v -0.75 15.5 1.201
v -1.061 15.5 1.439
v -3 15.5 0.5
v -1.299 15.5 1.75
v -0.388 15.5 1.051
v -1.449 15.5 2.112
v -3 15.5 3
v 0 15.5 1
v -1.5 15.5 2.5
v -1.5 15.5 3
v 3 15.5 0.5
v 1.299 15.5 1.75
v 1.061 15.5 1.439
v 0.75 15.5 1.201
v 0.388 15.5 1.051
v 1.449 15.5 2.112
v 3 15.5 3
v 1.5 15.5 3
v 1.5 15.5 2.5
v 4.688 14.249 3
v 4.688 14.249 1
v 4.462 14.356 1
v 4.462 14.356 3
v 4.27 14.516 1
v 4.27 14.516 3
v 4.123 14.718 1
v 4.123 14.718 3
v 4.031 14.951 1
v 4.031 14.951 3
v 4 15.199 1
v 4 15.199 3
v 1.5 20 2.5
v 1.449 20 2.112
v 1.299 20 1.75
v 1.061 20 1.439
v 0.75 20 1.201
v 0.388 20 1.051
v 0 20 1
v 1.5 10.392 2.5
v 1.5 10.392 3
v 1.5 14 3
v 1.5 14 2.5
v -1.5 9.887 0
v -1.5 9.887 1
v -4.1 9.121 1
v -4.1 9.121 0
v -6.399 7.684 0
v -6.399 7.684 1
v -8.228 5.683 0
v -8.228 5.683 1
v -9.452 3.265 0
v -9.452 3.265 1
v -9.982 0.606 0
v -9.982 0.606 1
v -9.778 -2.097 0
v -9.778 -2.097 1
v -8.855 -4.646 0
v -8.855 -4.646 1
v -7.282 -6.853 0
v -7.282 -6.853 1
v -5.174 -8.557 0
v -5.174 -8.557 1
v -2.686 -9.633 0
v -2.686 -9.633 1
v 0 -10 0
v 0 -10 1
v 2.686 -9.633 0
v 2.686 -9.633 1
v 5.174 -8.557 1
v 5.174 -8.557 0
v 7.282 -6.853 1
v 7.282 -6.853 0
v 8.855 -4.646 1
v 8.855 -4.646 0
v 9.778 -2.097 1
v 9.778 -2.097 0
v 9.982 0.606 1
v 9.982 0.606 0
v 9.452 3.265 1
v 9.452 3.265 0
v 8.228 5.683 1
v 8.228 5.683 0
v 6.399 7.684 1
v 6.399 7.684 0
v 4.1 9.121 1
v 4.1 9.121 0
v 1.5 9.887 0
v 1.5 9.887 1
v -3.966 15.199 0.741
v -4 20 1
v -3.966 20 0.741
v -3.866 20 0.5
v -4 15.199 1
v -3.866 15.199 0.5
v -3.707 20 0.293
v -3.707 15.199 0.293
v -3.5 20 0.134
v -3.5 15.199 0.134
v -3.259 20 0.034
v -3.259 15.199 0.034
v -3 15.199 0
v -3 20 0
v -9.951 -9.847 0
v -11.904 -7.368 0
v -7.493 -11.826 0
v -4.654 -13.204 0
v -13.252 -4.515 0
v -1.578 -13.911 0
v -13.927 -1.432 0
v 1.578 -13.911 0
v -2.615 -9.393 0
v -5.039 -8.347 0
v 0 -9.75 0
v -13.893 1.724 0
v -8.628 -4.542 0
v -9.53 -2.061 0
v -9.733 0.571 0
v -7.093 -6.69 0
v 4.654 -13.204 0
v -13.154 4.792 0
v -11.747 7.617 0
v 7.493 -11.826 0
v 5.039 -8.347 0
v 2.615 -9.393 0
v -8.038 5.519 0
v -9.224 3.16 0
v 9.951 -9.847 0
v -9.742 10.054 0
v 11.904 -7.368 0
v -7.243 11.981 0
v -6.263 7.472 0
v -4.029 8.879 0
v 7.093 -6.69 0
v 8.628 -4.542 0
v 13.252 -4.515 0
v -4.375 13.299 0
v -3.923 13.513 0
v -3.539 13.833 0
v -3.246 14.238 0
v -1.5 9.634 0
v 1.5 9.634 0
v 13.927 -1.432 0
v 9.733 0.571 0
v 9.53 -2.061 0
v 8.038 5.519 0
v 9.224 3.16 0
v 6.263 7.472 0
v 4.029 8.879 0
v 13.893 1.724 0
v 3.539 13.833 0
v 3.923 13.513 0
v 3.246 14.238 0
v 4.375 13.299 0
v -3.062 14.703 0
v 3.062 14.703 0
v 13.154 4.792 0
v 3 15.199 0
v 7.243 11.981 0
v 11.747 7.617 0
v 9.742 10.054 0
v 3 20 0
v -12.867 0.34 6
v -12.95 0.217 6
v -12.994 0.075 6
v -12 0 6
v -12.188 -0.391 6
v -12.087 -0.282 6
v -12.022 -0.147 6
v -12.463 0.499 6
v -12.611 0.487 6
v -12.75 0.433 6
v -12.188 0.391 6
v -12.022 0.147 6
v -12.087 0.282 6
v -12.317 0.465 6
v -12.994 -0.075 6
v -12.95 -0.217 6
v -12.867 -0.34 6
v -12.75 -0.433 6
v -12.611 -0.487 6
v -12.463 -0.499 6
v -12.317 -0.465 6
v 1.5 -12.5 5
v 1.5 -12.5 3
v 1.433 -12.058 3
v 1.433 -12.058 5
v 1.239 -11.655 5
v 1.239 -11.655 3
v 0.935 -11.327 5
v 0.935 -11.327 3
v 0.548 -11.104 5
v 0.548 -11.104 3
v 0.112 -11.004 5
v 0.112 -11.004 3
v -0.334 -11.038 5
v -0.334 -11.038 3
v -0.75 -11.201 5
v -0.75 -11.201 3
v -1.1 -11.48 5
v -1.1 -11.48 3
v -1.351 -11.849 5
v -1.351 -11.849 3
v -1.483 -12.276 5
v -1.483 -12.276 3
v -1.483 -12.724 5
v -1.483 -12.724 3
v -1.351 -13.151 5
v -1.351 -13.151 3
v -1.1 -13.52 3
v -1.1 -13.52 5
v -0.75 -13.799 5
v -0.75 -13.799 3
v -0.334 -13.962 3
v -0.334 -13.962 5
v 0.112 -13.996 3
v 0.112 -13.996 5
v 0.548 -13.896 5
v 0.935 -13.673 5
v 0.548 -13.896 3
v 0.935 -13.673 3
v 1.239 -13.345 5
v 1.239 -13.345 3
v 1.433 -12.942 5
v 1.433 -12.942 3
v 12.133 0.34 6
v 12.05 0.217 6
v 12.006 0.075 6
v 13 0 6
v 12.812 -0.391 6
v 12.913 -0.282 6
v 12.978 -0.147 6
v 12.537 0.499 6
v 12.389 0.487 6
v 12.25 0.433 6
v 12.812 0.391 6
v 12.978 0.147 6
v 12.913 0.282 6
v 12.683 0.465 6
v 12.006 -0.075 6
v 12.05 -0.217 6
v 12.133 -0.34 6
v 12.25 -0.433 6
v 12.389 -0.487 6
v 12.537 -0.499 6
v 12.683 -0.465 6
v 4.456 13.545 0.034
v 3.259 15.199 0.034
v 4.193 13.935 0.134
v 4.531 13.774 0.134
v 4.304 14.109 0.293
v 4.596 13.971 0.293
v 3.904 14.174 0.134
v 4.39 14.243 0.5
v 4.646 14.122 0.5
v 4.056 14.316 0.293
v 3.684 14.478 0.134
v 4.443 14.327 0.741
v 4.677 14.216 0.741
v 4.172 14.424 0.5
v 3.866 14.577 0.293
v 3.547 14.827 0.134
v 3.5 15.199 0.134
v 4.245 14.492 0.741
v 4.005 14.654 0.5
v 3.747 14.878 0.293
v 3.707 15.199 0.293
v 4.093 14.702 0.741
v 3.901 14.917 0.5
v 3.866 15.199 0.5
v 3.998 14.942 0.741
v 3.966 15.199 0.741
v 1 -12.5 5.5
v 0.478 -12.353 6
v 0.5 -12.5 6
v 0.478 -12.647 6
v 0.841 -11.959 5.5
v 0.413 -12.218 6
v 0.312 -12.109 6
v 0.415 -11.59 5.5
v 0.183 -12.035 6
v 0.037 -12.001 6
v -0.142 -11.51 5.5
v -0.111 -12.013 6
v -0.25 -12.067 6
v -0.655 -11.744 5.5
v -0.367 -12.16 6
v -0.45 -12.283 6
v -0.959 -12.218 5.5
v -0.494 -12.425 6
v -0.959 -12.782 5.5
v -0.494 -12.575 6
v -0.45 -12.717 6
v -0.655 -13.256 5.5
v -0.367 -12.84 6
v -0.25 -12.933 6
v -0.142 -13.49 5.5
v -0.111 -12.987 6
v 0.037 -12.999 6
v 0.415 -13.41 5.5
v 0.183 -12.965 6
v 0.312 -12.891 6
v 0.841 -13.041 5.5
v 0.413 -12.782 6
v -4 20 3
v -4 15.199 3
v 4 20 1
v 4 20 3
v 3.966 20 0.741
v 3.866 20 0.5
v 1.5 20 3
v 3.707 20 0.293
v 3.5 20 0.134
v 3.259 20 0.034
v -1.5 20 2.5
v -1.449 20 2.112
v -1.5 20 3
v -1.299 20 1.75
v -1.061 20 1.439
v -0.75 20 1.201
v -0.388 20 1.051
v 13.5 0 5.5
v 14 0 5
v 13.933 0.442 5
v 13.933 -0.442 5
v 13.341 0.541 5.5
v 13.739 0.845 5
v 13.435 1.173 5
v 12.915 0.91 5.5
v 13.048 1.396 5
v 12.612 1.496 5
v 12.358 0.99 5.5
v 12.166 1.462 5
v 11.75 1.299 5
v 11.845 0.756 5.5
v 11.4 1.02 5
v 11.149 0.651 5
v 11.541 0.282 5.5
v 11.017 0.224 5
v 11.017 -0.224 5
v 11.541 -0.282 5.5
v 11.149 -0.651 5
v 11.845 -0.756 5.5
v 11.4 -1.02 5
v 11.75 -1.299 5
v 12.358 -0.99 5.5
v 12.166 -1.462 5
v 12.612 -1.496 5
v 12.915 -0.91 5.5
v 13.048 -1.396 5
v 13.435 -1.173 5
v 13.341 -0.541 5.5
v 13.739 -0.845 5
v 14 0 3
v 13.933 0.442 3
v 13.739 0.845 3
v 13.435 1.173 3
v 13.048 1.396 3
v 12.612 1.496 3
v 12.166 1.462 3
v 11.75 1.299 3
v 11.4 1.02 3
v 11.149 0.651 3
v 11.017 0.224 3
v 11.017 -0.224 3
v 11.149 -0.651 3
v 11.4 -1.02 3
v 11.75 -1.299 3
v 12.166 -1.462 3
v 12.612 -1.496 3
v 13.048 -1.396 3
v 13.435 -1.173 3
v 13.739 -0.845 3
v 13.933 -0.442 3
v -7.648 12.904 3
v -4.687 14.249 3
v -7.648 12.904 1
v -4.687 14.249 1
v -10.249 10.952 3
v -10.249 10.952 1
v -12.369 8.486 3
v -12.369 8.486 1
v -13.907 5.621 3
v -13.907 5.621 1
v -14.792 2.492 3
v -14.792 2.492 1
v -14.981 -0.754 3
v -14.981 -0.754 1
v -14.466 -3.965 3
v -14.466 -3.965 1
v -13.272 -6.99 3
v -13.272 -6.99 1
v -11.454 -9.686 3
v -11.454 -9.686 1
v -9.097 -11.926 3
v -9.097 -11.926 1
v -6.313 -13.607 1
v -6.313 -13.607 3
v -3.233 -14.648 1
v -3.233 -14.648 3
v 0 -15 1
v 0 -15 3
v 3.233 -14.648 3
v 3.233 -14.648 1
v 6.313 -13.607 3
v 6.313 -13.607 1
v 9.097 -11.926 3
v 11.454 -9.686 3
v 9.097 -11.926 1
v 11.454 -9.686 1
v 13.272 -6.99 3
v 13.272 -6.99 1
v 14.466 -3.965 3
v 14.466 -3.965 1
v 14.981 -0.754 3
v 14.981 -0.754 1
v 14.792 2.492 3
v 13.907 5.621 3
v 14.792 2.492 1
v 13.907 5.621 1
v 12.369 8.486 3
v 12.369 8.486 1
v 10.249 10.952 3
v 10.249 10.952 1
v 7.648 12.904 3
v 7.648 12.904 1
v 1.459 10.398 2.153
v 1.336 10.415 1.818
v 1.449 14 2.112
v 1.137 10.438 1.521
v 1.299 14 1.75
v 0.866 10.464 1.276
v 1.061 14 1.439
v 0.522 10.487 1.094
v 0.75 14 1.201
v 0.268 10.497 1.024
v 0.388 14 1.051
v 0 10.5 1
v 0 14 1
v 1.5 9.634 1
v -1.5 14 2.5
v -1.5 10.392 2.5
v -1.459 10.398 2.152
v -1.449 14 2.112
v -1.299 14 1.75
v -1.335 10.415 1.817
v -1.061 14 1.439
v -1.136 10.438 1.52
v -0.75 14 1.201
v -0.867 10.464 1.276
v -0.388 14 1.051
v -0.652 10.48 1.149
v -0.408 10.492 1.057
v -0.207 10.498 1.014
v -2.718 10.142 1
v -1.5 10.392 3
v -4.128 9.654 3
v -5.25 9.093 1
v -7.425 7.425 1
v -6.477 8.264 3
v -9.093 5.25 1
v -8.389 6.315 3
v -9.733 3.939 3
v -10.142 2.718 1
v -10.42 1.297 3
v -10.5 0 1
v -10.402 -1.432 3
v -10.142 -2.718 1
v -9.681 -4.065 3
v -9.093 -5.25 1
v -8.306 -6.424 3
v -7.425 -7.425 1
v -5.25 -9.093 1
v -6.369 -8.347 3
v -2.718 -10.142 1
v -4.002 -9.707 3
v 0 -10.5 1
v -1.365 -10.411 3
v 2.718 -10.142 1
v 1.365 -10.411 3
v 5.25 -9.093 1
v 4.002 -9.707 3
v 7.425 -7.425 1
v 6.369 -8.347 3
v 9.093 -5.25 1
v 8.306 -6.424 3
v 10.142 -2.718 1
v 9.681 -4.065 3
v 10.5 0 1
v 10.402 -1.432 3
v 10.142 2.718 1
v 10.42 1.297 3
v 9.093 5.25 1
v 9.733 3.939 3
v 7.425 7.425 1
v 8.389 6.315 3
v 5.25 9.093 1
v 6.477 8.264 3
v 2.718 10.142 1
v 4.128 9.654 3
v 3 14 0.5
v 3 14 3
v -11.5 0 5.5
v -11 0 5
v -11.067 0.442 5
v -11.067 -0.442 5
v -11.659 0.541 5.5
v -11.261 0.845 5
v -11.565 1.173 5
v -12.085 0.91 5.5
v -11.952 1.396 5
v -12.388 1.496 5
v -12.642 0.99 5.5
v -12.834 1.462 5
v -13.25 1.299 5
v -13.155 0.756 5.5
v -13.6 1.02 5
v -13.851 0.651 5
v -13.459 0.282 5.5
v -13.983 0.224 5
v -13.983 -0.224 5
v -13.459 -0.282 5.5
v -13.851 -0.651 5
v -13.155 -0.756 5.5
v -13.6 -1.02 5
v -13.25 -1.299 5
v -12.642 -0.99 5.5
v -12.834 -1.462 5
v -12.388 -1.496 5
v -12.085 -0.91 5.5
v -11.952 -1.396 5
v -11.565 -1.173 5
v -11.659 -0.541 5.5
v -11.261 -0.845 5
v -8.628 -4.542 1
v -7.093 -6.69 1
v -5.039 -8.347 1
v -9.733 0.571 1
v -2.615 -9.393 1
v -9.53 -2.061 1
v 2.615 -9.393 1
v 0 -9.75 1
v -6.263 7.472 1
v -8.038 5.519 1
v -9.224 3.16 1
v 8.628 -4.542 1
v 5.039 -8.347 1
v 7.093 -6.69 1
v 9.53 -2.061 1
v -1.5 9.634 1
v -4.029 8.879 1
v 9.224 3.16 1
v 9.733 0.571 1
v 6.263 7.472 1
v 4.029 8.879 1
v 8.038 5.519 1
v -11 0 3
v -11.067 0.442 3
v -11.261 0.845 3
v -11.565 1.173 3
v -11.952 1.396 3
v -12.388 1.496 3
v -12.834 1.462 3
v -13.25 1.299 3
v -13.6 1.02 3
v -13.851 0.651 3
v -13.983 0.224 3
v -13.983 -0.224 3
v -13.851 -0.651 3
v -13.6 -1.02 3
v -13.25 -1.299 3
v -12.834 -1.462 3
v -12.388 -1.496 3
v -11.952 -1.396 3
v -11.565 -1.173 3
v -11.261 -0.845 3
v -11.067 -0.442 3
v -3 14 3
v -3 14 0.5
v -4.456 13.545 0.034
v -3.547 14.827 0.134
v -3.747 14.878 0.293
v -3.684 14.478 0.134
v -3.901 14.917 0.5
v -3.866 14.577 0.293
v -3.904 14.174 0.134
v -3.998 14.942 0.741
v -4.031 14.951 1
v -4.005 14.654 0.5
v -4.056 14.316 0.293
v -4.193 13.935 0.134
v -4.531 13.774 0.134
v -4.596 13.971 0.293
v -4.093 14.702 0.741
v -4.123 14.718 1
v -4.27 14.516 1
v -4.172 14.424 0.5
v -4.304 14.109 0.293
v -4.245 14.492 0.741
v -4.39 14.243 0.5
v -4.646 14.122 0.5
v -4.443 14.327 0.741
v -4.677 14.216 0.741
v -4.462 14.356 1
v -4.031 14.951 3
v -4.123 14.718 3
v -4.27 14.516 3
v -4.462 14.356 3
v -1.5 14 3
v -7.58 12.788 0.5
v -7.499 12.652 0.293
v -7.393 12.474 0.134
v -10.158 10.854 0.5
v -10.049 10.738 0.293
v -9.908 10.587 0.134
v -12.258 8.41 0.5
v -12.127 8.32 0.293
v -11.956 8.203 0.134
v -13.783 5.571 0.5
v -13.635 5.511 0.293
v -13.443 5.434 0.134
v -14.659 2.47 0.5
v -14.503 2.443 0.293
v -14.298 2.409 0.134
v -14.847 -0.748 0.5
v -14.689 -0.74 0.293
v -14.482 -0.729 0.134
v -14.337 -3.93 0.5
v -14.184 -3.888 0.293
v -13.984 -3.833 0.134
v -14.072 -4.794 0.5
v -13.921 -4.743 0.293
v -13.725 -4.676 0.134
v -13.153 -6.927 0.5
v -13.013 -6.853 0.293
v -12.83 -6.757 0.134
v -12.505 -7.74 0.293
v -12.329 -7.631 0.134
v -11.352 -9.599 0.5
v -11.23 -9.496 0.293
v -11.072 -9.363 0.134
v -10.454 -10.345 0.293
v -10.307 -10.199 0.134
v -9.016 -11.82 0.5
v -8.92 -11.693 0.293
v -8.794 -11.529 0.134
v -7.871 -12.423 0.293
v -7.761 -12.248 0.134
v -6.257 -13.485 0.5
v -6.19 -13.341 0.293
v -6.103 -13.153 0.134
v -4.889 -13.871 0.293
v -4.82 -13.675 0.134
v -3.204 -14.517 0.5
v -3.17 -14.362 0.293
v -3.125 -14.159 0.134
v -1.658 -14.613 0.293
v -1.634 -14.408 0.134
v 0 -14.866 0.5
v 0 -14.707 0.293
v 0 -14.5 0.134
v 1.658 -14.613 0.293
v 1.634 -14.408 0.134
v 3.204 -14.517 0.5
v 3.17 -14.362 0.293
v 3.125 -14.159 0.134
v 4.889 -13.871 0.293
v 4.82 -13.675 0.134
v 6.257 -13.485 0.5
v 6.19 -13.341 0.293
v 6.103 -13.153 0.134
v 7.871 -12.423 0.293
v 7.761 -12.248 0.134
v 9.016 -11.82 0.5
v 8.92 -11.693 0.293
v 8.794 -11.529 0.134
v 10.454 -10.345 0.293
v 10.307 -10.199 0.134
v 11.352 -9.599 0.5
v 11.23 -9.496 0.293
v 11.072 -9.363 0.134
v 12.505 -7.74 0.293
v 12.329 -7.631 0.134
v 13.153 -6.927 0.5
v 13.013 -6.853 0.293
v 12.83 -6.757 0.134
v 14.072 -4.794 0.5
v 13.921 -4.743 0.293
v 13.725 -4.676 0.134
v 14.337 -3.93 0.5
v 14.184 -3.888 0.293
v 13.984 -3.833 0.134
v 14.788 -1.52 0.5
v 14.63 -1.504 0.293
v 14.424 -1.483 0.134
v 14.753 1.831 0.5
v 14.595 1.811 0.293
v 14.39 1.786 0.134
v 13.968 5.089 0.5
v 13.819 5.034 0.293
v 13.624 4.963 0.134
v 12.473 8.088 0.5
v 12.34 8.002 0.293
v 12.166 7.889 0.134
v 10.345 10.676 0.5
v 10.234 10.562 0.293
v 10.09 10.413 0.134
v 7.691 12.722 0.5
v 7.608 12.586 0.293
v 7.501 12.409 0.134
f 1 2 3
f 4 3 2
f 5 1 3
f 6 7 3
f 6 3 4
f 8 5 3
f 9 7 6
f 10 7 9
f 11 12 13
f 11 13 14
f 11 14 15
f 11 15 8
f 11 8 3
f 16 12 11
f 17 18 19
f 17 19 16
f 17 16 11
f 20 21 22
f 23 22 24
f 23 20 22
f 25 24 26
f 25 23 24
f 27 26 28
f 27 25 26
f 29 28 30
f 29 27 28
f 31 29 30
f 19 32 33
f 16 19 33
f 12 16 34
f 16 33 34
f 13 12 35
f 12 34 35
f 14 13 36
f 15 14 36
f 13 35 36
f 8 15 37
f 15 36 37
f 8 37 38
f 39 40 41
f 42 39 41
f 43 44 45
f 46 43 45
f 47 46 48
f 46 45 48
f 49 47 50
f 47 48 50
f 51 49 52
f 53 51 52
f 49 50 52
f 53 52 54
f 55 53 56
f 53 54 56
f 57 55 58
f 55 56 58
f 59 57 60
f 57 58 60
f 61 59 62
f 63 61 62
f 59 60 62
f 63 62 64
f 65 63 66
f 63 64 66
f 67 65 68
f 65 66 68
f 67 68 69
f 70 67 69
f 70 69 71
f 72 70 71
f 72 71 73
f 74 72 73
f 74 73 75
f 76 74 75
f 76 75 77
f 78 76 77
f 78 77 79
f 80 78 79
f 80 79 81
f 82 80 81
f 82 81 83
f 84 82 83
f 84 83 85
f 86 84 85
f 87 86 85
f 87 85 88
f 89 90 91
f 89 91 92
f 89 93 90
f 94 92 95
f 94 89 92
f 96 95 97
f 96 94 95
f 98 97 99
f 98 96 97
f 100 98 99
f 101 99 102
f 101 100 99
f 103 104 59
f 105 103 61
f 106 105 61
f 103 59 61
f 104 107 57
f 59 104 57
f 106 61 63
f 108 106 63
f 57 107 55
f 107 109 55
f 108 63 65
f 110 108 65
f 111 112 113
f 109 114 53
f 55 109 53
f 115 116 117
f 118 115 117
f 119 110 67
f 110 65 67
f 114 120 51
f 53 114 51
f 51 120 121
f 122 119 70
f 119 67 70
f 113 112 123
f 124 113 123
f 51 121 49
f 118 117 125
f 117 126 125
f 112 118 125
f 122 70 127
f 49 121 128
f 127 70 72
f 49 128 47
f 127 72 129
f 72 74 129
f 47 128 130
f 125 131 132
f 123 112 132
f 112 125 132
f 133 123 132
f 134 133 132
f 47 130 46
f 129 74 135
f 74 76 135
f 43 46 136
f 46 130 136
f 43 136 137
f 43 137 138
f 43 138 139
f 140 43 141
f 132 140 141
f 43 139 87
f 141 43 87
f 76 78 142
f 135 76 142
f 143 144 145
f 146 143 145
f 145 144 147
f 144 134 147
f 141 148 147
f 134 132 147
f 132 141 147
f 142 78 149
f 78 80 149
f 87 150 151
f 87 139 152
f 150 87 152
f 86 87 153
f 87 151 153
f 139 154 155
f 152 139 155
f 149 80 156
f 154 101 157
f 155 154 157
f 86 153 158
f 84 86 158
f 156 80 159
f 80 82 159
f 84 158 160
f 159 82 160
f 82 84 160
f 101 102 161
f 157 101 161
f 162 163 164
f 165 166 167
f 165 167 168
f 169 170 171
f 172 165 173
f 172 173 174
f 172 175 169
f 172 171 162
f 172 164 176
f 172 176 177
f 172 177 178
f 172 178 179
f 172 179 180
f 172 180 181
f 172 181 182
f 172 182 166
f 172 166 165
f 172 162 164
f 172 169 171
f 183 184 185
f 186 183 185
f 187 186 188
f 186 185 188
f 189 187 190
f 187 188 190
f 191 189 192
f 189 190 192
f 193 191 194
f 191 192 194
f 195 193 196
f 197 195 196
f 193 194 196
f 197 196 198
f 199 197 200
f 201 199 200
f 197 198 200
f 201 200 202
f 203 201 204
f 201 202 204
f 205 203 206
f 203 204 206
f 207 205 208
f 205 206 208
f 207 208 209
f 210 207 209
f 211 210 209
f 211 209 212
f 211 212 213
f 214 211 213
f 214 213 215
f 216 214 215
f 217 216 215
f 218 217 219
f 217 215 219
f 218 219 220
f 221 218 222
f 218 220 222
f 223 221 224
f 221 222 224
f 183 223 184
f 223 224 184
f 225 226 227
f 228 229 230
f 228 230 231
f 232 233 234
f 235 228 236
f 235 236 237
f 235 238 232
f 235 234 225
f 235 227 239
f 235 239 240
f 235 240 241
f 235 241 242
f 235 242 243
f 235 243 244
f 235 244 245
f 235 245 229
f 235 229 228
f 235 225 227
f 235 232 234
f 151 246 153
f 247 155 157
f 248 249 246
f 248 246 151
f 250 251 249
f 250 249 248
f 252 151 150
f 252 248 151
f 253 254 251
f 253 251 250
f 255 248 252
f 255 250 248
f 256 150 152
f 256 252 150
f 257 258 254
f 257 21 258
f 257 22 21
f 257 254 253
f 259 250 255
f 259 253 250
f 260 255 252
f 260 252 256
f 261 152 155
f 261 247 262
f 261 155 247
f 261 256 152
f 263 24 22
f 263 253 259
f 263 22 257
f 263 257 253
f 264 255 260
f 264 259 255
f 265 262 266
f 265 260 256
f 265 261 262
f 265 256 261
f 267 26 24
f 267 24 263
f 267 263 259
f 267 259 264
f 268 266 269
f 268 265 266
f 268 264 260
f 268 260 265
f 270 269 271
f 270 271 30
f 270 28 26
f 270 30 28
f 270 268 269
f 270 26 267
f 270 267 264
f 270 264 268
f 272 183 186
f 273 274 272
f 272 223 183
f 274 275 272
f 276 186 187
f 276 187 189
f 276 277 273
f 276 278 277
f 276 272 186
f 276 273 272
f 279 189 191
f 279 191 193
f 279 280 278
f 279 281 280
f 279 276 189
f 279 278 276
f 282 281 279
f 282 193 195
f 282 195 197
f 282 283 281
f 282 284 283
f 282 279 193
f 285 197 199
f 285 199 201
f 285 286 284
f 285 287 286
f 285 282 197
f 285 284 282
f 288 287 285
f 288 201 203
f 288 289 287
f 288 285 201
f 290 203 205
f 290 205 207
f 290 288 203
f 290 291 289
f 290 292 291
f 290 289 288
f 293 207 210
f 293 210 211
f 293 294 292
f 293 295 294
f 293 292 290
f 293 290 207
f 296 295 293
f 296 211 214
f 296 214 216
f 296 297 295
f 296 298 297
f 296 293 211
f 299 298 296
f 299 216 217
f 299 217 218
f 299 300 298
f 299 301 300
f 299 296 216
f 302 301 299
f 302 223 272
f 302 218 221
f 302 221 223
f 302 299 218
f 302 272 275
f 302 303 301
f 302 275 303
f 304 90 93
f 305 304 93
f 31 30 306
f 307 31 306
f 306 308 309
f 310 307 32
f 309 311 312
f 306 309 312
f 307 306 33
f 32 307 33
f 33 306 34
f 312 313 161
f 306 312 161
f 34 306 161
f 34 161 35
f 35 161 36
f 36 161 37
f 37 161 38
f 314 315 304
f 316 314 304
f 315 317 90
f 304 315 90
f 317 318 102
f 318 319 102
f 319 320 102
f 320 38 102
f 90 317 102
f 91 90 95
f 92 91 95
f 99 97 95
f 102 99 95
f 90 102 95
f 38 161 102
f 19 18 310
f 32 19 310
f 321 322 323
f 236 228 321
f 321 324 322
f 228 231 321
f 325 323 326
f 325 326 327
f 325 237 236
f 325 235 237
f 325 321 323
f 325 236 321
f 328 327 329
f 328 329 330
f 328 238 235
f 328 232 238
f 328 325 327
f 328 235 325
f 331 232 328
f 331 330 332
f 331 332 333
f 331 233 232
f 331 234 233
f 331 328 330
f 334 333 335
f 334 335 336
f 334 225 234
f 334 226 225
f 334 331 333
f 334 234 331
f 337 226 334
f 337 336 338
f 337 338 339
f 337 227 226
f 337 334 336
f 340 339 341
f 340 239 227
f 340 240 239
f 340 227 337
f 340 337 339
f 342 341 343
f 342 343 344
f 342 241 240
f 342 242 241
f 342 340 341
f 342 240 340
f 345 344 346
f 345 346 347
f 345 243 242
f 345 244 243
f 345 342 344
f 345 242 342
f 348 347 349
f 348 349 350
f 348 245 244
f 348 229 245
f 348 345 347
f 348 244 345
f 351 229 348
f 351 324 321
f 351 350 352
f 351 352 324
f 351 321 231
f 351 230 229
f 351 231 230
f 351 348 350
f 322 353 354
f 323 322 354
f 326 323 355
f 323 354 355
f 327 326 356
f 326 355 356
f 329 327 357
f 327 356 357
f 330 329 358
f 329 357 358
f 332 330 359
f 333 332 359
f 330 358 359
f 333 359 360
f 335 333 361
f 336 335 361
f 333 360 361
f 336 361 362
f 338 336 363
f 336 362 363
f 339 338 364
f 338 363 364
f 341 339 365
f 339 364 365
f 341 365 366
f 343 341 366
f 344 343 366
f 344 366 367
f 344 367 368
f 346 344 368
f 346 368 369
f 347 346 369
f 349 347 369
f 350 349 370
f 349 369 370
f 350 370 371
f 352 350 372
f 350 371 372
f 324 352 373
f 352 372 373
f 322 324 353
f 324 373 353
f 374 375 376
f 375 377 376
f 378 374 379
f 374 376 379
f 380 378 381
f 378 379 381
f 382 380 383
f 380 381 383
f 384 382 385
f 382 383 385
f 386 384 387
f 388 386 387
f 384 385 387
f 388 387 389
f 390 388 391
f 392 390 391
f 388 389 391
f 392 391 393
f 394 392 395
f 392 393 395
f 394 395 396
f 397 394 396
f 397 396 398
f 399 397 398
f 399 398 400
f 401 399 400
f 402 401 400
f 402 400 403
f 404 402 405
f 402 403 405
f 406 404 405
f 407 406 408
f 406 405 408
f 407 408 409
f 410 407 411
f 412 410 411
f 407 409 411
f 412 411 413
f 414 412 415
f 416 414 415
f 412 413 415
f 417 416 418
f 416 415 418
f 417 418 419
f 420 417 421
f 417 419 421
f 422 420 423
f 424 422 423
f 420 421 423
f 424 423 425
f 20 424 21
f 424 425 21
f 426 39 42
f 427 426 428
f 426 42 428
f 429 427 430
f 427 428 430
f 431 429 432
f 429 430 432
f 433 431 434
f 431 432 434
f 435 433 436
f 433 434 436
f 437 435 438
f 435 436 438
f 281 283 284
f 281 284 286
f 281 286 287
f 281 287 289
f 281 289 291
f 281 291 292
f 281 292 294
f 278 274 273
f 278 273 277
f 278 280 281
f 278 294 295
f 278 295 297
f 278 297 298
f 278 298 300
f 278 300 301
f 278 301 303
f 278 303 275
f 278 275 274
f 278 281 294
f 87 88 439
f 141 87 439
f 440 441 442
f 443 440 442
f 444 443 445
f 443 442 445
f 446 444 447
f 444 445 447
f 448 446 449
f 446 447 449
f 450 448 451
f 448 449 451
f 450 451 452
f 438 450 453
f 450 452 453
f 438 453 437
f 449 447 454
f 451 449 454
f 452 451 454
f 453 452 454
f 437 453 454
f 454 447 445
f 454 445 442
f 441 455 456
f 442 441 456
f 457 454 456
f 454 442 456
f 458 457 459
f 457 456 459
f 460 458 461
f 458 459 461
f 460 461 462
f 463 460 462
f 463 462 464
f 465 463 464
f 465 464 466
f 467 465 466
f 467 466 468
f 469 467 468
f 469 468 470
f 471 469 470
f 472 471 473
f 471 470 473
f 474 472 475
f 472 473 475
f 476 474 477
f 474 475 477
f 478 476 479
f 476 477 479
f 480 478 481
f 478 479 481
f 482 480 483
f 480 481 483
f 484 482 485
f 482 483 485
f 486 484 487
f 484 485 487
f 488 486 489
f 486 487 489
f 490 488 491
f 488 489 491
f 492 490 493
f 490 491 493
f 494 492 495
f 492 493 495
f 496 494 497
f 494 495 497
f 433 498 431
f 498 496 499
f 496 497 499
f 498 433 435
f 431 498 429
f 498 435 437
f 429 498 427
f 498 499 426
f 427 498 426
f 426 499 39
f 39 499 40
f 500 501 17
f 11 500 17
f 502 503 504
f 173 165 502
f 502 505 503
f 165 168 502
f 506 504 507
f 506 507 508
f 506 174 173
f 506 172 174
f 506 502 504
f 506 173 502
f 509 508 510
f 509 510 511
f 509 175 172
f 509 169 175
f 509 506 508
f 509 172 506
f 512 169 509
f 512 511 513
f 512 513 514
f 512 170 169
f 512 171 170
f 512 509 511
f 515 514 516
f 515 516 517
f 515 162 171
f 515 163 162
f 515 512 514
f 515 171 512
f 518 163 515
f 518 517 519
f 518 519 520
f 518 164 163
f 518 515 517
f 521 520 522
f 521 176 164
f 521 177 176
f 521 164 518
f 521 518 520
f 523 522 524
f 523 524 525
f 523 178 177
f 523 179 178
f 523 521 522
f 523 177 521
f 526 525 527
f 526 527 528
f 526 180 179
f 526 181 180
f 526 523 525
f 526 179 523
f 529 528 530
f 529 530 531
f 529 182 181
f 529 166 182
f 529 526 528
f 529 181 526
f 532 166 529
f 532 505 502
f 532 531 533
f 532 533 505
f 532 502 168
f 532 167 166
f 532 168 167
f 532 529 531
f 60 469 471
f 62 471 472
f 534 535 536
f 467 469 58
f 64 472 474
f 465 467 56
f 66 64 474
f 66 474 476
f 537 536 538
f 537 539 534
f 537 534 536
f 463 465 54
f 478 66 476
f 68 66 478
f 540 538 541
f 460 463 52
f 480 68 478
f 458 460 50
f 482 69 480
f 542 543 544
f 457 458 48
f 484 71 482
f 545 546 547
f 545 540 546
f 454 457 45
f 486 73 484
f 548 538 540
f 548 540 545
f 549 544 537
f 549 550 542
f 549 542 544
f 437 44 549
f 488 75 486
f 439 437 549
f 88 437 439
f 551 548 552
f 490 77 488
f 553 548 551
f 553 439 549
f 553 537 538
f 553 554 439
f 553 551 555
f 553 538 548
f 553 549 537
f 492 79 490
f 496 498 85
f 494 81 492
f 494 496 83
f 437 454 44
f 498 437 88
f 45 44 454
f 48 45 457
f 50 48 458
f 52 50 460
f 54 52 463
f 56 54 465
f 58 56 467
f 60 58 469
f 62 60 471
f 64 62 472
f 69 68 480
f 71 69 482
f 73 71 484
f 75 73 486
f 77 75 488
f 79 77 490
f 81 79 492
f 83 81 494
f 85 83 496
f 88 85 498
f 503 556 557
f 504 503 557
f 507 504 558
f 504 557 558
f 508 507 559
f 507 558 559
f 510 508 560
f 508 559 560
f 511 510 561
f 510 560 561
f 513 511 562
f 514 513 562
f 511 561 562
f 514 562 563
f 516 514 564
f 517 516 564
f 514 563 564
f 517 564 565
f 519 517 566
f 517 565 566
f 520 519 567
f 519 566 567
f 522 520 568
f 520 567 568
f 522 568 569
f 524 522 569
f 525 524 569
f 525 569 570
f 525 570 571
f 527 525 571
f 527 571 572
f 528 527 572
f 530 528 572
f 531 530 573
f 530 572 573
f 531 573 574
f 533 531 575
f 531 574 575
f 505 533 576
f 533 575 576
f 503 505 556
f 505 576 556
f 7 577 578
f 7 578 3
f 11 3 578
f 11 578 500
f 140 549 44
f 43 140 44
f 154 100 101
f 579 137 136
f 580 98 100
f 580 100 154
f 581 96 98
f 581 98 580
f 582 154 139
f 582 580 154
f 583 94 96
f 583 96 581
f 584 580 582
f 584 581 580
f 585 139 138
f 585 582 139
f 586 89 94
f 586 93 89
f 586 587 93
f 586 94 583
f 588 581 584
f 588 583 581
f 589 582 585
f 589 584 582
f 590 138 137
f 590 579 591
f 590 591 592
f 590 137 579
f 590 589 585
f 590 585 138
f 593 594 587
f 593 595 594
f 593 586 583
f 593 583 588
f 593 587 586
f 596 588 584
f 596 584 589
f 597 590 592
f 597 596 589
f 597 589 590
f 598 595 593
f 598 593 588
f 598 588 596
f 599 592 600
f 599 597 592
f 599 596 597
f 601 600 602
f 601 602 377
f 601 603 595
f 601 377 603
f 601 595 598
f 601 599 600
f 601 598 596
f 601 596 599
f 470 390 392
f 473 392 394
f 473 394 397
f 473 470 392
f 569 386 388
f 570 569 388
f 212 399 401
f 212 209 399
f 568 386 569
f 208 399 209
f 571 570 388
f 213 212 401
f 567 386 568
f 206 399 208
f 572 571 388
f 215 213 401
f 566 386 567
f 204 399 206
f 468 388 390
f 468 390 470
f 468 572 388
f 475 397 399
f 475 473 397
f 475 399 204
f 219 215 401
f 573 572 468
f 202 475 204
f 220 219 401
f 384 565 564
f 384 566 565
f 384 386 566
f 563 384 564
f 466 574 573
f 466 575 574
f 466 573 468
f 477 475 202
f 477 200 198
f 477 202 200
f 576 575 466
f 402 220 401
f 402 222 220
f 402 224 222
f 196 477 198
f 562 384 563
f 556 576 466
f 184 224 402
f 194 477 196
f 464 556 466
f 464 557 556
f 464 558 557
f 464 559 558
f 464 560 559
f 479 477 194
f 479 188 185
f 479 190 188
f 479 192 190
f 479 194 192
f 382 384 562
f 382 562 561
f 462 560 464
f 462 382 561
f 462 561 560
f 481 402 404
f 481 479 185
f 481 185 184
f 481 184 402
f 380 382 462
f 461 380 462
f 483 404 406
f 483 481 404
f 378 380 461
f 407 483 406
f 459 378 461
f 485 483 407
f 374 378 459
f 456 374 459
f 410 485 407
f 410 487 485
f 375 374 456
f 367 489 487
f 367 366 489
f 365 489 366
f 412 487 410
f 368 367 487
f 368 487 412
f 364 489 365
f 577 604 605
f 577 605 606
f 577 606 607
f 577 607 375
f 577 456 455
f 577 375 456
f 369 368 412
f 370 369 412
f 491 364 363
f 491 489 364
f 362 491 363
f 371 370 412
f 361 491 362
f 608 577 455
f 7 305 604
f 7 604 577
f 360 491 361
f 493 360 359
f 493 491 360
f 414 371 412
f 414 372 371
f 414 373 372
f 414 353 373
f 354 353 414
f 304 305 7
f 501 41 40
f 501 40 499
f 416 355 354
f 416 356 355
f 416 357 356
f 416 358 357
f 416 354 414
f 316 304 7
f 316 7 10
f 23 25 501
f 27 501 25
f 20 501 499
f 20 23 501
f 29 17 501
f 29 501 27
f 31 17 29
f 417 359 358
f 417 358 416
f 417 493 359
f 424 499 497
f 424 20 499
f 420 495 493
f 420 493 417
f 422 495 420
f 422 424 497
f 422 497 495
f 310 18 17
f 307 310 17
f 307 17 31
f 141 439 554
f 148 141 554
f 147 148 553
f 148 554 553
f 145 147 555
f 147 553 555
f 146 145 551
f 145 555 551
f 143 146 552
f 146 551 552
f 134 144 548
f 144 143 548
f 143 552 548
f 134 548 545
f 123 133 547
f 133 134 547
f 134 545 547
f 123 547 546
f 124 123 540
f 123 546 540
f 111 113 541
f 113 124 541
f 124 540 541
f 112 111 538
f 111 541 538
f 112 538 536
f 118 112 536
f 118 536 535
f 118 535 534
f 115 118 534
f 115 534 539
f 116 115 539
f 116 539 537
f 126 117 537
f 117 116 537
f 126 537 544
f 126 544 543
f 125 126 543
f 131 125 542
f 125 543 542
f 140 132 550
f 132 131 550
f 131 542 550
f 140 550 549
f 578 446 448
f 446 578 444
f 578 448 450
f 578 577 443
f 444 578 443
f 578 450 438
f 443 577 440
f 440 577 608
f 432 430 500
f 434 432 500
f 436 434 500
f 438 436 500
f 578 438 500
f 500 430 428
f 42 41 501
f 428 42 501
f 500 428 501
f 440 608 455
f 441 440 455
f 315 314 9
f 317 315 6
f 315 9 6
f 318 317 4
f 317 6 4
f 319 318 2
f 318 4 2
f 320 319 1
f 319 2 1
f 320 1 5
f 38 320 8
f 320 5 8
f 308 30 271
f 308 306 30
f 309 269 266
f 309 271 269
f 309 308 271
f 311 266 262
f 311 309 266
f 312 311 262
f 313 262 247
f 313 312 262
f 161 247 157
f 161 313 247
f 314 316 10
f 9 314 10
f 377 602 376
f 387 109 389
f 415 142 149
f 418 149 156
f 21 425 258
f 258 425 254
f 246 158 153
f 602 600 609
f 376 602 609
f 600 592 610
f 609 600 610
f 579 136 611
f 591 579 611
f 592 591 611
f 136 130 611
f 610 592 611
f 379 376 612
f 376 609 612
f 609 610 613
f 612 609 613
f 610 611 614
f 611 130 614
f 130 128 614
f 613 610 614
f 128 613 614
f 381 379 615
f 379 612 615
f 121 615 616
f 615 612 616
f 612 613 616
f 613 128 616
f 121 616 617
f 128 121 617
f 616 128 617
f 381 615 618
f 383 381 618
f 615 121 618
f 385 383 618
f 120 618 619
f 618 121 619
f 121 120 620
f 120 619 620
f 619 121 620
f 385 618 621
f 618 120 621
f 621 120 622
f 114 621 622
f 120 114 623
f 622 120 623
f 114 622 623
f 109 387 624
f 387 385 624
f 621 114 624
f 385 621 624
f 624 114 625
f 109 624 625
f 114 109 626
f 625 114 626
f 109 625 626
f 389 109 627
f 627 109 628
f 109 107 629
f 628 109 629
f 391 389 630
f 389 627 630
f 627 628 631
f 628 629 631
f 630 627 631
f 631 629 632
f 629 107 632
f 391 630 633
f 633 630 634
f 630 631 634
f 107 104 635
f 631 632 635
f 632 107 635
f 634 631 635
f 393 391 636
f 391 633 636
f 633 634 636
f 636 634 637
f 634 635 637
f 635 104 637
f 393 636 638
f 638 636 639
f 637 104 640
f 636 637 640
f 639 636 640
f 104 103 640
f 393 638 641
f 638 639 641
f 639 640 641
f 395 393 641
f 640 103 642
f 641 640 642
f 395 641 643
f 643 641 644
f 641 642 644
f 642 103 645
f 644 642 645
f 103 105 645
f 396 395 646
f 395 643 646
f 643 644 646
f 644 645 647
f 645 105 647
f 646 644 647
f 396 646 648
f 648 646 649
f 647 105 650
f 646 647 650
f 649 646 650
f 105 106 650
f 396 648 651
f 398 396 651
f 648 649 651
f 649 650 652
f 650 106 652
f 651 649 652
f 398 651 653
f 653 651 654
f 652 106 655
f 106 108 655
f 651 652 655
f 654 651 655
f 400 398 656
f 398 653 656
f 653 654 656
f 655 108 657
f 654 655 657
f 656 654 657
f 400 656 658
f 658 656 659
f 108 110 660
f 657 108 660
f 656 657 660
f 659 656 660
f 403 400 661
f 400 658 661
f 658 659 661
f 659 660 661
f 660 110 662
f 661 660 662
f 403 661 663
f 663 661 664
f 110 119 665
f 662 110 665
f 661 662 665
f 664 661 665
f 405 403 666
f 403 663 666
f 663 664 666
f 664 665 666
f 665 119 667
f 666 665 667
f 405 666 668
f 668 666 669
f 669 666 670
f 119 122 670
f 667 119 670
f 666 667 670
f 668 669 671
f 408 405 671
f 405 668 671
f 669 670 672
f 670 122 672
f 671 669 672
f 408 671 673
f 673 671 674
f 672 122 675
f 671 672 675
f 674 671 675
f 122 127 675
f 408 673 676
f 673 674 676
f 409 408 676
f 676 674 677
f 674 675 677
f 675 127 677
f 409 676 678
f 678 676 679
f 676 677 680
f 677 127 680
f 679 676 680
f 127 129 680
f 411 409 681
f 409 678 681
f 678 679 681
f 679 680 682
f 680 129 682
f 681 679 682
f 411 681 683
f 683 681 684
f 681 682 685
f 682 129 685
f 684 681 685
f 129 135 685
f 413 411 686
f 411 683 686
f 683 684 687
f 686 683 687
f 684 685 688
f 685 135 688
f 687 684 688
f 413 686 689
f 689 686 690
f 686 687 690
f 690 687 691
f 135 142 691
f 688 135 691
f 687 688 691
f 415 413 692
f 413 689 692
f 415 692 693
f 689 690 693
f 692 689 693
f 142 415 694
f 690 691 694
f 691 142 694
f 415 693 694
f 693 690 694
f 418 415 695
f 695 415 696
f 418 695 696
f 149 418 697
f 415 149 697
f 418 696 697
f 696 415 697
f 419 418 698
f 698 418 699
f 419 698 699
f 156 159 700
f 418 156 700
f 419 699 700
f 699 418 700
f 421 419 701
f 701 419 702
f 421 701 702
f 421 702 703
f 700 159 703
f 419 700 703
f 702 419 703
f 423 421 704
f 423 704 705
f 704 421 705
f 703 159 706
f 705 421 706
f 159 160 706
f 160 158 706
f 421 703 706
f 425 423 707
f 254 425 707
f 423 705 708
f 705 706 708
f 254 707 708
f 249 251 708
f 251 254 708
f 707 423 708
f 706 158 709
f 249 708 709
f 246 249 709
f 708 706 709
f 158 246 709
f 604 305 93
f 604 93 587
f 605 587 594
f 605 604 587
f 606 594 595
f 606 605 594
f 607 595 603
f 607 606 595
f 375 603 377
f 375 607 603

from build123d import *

# Parameters (mm, degrees)
F1_DEPTH  = 3
F3_DEPTH  = 2
F4_R      = 1.5
F5_DEPTH  = 3
F6_SIZE   = 1
F7_R      = 1
F9_DEPTH  = 1.0010001
F10_R     = 1.49999
F11_W     = 6
F11_H     = 1.5
F12_DEPTH = 2.5


# Not quite as in the source:
# - a fillet or chamfer is up to 0.001 mm smaller than in the source, because OpenCascade refuses the exact size


with BuildPart() as f1:
    # F0 (on Top) → F1 (new body)
    with BuildSketch(Plane.XY):
        with BuildLine():
            Line((-4, 20), (-4, 14.4568322948))
            ThreePointArc((-4, 14.4568322948), (0, -15), (4, 14.4568322948))
            Line((4, 14.4568322948), (4, 20))
            Line((4, 20), (-4, 20))
        make_face()
    extrude(amount=F1_DEPTH)

    # F2 (on face) → F3 (cut)
    with BuildSketch(Plane.XY.offset(3)):
        with BuildLine():
            Line((1.5, 20), (-1.5, 20))
            Line((-1.5, 20), (-1.5, 10.3923048454))
            ThreePointArc((-1.5, 10.3923048454), (0, -10.5), (1.5, 10.3923048454))
            Line((1.5, 10.3923048454), (1.5, 20))
        make_face()
    extrude(amount=-F3_DEPTH, mode=Mode.SUBTRACT)

    # F4 (on face) → F5 (join)
    with BuildSketch(Plane.XY.offset(3)):
        with Locations((12.5, 0)):
            Circle(F4_R)
        with Locations((-12.5, 0)):
            Circle(F4_R)
        with Locations((0, -12.5)):
            Circle(F4_R)
    extrude(amount=F5_DEPTH)

    # F6
    f6_edges = [f1.edges().sort_by_distance(p)[0] for p in [
        (-14, 0, 6),
        (-1.5, -12.5, 6),
        (11, 0, 6),
    ]]
    chamfer(f6_edges, length=F6_SIZE)

    # F7
    f7_edges = [f1.edges().sort_by_distance(p)[0] for p in [
        (4, 17.228416, 0),
        (4, 14.456832, 1.5),
        (-4, 14.456832, 1.5),
        (-4, 17.228416, 0),
        (0, -15, 0),
    ]]
    fillet(f7_edges, radius=F7_R)

    # F8 (on face) → F9 (cut, through all)
    with BuildSketch(Plane.XY.offset(1)):
        with BuildLine():
            Line((-1.5, 9.633924434), (-1.5, 9.8868599666))
            ThreePointArc((-1.5, 9.8868599666), (0, -10), (1.5, 9.8868599666))
            Line((1.5, 9.8868599666), (1.5, 9.633924434))
            ThreePointArc((1.5, 9.633924434), (0, -9.75), (-1.5, 9.633924434))
        make_face()
    extrude(amount=-F9_DEPTH, mode=Mode.SUBTRACT)

    # F10 (radius 1.5 in the source; OpenCascade refuses exactly that, so slightly less here)
    f10_edges = [f1.edges().sort_by_distance(p)[0] for p in [
        (1.5, 15.196152, 1),
        (-1.5, 15.196152, 1),
    ]]
    fillet(f10_edges, radius=F10_R)

    # F11 (on face) → F12 (cut)
    with BuildSketch(Plane.XY.offset(3)):
        with Locations((0, 14.75)):
            Rectangle(F11_W, F11_H)
    extrude(amount=-F12_DEPTH, mode=Mode.SUBTRACT)


solid = f1.part
